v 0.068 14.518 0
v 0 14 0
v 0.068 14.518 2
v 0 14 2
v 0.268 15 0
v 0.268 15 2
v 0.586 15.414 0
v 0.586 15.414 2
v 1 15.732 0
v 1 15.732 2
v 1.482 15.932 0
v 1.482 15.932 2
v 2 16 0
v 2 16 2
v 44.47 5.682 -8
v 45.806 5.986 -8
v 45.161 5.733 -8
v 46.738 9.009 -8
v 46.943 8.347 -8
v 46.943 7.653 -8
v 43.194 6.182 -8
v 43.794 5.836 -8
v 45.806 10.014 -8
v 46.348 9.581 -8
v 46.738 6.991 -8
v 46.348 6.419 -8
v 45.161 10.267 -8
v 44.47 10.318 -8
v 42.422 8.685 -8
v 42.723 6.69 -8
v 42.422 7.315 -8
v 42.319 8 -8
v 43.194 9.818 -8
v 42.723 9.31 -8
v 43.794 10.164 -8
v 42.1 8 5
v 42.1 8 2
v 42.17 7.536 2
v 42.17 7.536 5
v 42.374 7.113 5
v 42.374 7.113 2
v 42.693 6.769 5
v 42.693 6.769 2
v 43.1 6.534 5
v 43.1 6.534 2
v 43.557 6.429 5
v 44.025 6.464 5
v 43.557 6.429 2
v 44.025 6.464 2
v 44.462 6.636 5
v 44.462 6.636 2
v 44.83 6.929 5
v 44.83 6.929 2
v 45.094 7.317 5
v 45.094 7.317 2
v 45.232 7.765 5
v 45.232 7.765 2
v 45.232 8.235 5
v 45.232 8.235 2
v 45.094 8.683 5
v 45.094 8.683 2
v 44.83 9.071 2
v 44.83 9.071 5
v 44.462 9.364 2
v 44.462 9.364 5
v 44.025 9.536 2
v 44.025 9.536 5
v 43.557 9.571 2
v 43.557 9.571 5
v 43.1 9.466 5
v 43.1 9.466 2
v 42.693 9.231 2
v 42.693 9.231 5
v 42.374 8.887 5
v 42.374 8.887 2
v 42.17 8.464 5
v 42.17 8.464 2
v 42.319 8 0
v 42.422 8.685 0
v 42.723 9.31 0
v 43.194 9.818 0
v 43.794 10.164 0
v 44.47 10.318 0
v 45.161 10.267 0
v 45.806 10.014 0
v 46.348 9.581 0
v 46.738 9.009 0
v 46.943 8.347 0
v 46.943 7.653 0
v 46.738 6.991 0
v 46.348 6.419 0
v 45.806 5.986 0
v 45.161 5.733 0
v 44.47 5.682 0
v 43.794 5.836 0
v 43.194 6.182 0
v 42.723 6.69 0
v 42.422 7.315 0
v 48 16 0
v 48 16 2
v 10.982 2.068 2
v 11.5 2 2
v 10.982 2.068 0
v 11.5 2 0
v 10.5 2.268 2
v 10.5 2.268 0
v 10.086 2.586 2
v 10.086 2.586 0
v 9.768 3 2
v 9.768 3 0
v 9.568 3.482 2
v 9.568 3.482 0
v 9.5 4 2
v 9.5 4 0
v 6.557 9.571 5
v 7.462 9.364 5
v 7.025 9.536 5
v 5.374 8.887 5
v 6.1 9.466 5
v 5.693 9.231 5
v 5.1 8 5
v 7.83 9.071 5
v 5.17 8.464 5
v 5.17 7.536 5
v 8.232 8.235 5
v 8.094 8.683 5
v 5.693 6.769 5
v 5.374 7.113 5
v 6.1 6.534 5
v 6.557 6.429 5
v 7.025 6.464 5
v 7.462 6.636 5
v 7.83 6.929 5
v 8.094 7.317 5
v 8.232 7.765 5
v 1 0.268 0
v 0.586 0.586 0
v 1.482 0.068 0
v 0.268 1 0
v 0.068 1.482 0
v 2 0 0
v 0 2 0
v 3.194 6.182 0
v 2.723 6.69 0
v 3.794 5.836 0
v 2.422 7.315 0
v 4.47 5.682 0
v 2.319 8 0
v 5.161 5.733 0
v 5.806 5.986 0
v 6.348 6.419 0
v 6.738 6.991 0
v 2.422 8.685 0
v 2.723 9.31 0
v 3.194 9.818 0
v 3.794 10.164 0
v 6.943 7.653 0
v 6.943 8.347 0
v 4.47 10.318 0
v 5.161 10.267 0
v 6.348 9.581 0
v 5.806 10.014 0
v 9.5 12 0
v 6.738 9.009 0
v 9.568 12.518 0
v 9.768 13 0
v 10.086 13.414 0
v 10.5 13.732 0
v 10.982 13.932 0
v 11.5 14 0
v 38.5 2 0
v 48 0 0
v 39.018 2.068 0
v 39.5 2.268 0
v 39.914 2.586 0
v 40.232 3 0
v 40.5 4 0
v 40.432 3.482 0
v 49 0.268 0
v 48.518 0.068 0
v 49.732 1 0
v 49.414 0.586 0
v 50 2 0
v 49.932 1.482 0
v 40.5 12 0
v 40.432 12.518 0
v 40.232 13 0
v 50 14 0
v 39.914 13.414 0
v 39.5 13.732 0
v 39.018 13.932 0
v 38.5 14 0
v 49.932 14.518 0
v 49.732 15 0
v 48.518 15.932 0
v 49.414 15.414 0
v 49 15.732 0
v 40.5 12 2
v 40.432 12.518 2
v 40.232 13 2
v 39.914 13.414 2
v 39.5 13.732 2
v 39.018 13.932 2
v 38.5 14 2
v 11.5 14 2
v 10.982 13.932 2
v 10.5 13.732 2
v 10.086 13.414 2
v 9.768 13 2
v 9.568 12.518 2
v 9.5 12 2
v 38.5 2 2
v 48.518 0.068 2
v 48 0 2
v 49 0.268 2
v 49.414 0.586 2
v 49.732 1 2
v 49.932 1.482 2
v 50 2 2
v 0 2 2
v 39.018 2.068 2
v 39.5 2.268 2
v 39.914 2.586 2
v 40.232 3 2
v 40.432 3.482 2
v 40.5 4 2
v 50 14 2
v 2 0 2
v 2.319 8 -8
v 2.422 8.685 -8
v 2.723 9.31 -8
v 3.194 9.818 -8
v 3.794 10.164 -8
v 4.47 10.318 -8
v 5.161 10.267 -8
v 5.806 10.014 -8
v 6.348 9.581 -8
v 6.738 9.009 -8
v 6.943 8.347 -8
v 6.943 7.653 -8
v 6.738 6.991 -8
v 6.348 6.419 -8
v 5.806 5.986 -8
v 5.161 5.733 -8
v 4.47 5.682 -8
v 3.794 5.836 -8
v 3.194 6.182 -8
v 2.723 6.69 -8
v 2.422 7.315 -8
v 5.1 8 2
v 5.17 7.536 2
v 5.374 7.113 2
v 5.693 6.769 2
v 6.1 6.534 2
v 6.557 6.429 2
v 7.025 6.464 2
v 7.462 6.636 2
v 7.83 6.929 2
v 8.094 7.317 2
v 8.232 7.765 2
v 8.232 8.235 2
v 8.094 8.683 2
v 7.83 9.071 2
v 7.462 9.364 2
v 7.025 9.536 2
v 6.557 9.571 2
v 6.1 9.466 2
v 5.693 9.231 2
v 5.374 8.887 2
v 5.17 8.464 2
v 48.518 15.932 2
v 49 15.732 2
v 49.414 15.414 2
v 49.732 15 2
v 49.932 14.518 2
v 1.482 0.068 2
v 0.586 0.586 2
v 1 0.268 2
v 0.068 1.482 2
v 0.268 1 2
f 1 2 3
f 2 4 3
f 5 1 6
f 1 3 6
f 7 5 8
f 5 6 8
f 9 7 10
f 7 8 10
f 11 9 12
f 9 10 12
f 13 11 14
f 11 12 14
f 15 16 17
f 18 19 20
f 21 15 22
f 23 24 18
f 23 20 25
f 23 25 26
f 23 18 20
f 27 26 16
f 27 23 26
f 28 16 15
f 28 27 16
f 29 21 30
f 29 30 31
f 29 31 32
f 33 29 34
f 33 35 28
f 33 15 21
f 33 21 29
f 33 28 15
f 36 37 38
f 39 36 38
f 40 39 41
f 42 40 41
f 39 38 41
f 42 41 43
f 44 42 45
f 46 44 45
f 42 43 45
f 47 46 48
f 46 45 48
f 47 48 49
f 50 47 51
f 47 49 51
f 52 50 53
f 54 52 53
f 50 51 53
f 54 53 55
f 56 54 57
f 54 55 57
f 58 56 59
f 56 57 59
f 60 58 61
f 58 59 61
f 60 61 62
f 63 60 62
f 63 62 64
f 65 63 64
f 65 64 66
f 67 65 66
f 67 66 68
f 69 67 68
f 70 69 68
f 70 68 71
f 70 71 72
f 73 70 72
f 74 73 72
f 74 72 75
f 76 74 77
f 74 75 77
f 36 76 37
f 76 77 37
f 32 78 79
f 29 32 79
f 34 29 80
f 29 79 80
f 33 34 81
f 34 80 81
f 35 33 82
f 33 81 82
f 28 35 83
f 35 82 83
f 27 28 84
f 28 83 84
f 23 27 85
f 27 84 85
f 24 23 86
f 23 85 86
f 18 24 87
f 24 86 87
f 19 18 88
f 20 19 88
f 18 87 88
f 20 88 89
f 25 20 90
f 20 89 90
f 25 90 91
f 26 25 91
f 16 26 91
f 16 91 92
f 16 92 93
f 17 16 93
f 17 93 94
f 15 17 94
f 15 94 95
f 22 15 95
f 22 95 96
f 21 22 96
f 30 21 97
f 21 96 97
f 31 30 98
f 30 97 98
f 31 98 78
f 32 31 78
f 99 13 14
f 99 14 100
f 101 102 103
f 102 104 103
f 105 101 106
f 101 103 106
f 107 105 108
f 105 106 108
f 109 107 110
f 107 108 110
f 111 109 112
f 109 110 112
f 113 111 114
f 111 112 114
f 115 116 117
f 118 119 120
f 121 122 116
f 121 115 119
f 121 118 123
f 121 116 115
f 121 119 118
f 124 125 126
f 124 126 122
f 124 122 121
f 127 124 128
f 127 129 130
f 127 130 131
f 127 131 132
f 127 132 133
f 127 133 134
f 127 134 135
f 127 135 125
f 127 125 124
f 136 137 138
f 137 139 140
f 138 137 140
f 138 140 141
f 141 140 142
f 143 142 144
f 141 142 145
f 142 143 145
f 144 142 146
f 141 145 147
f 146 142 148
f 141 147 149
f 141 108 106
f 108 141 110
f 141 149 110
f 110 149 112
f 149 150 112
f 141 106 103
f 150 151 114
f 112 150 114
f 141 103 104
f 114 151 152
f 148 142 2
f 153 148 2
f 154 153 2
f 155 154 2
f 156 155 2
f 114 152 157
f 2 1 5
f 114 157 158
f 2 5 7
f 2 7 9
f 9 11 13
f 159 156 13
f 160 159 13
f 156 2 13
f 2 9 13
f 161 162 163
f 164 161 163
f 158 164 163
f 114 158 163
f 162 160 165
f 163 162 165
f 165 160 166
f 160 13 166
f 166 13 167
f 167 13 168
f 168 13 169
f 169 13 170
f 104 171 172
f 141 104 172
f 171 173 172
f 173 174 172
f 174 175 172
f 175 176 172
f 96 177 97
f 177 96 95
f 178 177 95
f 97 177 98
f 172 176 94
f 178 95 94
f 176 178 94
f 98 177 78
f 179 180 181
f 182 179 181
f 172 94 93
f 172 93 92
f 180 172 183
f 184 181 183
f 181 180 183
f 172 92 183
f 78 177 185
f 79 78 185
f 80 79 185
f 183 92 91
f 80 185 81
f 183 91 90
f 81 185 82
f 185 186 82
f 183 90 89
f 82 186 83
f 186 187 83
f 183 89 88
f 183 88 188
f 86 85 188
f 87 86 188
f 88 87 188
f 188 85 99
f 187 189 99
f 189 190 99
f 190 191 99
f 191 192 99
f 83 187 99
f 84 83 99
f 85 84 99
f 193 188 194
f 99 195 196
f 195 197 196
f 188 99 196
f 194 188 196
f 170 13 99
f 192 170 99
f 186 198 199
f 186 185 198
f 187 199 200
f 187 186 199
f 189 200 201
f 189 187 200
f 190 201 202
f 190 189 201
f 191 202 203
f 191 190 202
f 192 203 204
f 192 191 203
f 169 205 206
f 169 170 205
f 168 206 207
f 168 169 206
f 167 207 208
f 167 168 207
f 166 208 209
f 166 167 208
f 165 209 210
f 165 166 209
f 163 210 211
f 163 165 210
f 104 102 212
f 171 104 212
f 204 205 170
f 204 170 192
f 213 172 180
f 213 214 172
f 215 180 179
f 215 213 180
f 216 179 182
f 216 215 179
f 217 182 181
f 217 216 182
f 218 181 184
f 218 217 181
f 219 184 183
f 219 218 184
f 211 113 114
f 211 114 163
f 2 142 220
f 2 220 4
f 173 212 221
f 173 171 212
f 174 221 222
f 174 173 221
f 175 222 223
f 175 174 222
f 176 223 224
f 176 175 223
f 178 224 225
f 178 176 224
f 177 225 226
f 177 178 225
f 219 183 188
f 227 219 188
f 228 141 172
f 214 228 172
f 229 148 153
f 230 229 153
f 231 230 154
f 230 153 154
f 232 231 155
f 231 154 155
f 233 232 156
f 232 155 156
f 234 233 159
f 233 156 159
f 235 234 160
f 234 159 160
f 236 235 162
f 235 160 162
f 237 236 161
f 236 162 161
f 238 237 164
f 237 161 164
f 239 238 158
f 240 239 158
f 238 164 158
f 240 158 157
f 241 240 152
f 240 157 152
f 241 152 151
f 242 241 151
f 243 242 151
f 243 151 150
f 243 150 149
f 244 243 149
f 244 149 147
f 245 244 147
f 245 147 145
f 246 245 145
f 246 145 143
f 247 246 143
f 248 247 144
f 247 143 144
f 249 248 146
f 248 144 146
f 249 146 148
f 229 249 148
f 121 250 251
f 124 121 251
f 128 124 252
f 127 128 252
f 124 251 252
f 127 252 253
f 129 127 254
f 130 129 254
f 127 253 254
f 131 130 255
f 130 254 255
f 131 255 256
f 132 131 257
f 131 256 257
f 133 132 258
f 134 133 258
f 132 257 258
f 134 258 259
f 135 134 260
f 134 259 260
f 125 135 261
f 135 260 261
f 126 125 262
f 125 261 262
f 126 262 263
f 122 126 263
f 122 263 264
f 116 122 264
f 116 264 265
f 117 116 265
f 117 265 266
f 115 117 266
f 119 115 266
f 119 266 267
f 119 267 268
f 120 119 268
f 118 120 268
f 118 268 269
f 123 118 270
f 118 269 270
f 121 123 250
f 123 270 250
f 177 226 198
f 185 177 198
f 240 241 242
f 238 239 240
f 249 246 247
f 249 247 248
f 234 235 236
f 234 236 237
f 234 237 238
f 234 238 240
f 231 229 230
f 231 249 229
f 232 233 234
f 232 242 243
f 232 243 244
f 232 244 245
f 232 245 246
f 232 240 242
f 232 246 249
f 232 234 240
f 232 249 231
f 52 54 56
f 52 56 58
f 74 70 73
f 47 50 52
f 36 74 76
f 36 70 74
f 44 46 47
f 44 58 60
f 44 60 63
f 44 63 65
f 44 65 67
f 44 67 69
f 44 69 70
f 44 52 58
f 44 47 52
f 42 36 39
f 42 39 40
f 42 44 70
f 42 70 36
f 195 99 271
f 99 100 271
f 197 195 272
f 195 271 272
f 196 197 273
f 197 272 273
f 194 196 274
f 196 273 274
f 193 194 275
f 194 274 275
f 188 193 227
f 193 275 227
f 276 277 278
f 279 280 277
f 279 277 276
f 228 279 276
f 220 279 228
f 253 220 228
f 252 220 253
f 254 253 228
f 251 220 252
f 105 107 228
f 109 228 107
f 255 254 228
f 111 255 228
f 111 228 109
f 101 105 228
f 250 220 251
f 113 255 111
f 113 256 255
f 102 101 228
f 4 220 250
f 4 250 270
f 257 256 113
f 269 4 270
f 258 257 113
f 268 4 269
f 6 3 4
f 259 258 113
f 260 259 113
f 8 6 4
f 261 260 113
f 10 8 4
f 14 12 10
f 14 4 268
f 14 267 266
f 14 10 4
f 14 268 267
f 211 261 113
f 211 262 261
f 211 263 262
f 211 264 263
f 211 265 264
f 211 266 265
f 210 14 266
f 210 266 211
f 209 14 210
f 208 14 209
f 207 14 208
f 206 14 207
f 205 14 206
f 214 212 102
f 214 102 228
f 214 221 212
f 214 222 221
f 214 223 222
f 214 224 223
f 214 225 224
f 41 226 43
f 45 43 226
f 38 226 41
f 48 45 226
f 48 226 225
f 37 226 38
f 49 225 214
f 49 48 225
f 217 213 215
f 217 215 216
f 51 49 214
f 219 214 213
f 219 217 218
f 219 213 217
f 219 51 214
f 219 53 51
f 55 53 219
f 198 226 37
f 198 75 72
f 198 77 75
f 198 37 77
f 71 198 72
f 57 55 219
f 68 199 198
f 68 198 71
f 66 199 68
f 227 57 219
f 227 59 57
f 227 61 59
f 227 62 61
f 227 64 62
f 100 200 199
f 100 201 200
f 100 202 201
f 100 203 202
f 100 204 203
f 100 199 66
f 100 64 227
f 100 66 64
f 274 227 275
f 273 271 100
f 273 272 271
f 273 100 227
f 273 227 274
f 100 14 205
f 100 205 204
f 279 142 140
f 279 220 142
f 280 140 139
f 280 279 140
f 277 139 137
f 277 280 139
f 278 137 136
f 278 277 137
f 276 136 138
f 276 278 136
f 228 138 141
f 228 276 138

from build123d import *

# Parameters (mm, degrees)
SKETCH1_W           = 50
SKETCH1_H           = 16
BOSS_EXTRUDE1_DEPTH = 2
SKETCH2_R           = 1.575
BOSS_EXTRUDE2_DEPTH = 3
SKETCH3_W           = 31
SKETCH3_H           = 12
CUT_EXTRUDE1_DEPTH  = 3
FILLET1_R           = 2
FILLET2_R           = 2
SKETCH4_R           = 2.325
BOSS_EXTRUDE3_DEPTH = 8


with BuildPart() as part:
    # Sketch1 → Boss-Extrude1 (new body)
    with BuildSketch(Plane.XY):
        with Locations((25, 8)):
            Rectangle(SKETCH1_W, SKETCH1_H)
    extrude(amount=BOSS_EXTRUDE1_DEPTH)

    # Sketch2 → Boss-Extrude2 (add)
    with BuildSketch(Plane.XY.offset(2)):
        with Locations(Location((6.675, 8, 0), (0, 0, 180))):
            Circle(SKETCH2_R)
        with Locations(Location((43.675, 8, 0), (0, 0, 180))):
            Circle(SKETCH2_R)
    extrude(amount=BOSS_EXTRUDE2_DEPTH)

    # Sketch3 → Cut-Extrude1 (cut)
    with BuildSketch(Plane.XY.offset(2)):
        with Locations((25, 8)):
            Rectangle(SKETCH3_W, SKETCH3_H)
    extrude(amount=-CUT_EXTRUDE1_DEPTH, mode=Mode.SUBTRACT)

    # Fillet1
    fillet1_edges = [part.edges().sort_by_distance(p)[0] for p in [
        (9.5, 2, 1),
        (9.5, 14, 1),
        (40.5, 14, 1),
        (40.5, 2, 1),
    ]]
    fillet(fillet1_edges, radius=FILLET1_R)

    # Fillet2
    fillet2_edges = [part.edges().sort_by_distance(p)[0] for p in [
        (0, 16, 1),
        (50, 16, 1),
        (50, 0, 1),
        (0, 0, 1),
    ]]
    fillet(fillet2_edges, radius=FILLET2_R)

    # Sketch4 → Boss-Extrude3 (add)
    with BuildSketch(Plane(origin=(0, 0, 0), x_dir=(-1, 0, 0), z_dir=(0, 0, -1))):
        with Locations((-44.643589023, 8)):
            Circle(SKETCH4_R)
        with Locations((-4.643589023, 8)):
            Circle(SKETCH4_R)
    extrude(amount=BOSS_EXTRUDE3_DEPTH)


solid = part.part
